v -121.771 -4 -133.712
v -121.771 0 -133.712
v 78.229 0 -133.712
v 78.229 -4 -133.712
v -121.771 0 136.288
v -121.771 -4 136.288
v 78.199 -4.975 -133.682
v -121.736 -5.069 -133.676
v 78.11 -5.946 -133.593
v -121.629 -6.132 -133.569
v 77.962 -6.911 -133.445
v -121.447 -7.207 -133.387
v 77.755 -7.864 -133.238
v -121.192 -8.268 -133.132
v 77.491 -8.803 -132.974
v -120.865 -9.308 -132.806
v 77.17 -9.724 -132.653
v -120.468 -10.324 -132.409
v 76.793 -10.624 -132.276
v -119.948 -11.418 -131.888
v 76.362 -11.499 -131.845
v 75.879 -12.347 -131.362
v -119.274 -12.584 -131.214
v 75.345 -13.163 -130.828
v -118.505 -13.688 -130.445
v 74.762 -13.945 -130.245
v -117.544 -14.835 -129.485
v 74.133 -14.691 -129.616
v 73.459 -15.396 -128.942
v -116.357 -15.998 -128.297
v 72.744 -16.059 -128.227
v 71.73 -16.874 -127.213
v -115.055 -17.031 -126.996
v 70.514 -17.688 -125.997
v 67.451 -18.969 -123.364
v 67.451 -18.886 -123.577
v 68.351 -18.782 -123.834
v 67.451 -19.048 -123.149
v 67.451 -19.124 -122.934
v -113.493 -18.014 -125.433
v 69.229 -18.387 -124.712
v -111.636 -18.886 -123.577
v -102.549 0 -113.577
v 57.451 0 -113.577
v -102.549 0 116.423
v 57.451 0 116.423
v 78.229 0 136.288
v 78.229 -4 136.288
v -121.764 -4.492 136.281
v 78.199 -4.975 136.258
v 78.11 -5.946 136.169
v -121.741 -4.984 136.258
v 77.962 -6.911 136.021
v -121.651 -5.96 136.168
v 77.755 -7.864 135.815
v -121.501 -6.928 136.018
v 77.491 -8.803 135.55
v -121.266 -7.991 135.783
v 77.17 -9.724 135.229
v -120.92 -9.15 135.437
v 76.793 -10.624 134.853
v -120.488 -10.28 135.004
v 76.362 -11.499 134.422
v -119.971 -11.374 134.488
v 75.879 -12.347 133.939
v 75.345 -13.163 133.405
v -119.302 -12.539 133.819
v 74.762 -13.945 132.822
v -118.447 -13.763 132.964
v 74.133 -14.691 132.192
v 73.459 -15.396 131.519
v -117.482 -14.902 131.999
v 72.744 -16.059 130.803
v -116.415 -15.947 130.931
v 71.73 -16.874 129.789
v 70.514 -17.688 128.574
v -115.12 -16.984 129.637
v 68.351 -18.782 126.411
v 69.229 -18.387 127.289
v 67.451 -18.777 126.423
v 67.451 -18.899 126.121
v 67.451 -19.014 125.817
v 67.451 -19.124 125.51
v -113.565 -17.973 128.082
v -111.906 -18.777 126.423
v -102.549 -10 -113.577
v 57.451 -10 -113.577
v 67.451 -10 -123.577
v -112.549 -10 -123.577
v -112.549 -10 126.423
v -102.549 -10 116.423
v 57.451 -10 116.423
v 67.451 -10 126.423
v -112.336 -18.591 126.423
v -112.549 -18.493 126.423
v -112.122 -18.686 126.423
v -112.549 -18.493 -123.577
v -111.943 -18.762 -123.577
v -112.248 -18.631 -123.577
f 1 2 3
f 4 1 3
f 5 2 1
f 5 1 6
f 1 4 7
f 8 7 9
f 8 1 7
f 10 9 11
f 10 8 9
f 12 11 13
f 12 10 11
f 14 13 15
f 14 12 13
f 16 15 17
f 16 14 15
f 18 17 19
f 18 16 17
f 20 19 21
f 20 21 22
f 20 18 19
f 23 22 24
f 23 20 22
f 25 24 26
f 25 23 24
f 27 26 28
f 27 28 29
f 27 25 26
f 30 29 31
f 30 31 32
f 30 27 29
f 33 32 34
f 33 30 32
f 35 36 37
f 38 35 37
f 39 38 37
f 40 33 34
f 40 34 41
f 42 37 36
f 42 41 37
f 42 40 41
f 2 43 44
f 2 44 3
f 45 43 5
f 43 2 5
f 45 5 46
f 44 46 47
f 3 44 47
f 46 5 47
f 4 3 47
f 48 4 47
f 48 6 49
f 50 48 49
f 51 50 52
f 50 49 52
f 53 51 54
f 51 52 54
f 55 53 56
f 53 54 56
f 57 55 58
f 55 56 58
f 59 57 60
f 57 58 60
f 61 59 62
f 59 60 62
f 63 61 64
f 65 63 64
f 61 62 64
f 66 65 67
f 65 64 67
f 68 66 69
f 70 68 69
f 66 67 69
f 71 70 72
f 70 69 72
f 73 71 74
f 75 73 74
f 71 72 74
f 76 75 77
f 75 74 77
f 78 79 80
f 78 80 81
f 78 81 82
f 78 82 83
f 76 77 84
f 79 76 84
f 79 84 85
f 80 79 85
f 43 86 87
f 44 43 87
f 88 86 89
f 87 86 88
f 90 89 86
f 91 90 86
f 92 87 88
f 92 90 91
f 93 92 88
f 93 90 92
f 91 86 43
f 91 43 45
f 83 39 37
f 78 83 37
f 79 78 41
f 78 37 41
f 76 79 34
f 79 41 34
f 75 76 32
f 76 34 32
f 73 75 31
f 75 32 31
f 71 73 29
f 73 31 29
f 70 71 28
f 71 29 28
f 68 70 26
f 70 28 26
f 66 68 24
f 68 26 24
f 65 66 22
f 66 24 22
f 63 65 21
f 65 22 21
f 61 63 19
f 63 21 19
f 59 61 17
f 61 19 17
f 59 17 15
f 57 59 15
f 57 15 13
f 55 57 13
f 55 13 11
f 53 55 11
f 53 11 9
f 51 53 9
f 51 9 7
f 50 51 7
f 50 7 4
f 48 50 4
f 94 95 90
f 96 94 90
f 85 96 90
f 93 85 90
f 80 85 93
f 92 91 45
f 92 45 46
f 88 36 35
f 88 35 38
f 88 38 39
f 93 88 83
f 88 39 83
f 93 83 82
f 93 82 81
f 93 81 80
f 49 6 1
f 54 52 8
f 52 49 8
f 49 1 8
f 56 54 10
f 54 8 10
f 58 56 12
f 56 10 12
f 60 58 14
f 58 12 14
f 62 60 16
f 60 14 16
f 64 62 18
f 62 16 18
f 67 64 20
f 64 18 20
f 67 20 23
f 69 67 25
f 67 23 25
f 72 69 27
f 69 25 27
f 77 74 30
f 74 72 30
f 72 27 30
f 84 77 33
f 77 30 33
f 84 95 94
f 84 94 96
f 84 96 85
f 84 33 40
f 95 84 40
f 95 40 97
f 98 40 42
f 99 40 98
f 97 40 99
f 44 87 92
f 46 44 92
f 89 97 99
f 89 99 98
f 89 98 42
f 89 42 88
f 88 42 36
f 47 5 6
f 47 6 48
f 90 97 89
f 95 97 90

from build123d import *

# Parameters (mm, degrees)
F0_W        = 200
F0_H        = 270
F1_DEPTH    = 20
F2_W        = 180
F2_H        = 250
F3_DEPTH    = 10
F4_W        = 160
F4_H        = 230
F5_DEPTH    = 25
F6_T1_DEPTH = 350
F6_T3_DEPTH = 280


# Not quite as in the source:
# - a fillet or chamfer that OpenCascade refuses, or shapes differently, is made with other operations: its cross-section is extruded or revolved along the edge and cut away or added


with BuildPart() as f1:
    # F0 (on Front) → F1 (new body)
    with BuildSketch(Plane.XZ):
        with Locations((-21.7714021464, 1.2882190198)):
            Rectangle(F0_W, F0_H)
    extrude(amount=F1_DEPTH)

    # F2 (on face) → F3 (cut)
    with BuildSketch(Plane.XZ.offset(20)):
        with Locations((-22.5493634492, 1.4232655292)):
            Rectangle(F2_W, F2_H)
    extrude(amount=-F3_DEPTH, mode=Mode.SUBTRACT)

    # F4 (on face) → F5 (cut)
    with BuildSketch(Plane.XZ.offset(10)):
        with Locations((-22.5493634492, 1.4232655292)):
            Rectangle(F4_W, F4_H)
    extrude(amount=-F5_DEPTH, mode=Mode.SUBTRACT)

    # F6: fillet of radius 16 on 4 edges, made by hand

    # F6_s2 → F6_t1 (cut)
    with BuildSketch(Plane.XY.offset(-173.7117809802)):
        with BuildLine():
            ThreePointArc((-121.7714021464, -4), (-117.0851106454, -15.313708499), (-105.7714021464, -20))
            Line((-105.7714021464, -20), (-121.7714021464, -20))
            Line((-121.7714021464, -20), (-121.7714021464, -4))
        make_face()
        with BuildLine():
            ThreePointArc((62.2285978536, -20), (73.5423063526, -15.313708499), (78.2285978536, -4))
            Line((78.2285978536, -4), (78.2285978536, -20))
            Line((78.2285978536, -20), (62.2285978536, -20))
        make_face()
    extrude(amount=F6_T1_DEPTH, mode=Mode.SUBTRACT)

    # F6_s4 → F6_t3 (cut)
    with BuildSketch(Plane.YZ.offset(-161.7714021464)):
        with BuildLine():
            ThreePointArc((-4, 136.2882190198), (-15.313708499, 131.6019275188), (-20, 120.2882190198))
            Line((-20, 120.2882190198), (-20, 136.2882190198))
            Line((-20, 136.2882190198), (-4, 136.2882190198))
        make_face()
        with BuildLine():
            ThreePointArc((-4, -133.7117809802), (-15.313708499, -129.0254894792), (-20, -117.7117809802))
            Line((-20, -117.7117809802), (-20, -133.7117809802))
            Line((-20, -133.7117809802), (-4, -133.7117809802))
        make_face()
    extrude(amount=F6_T3_DEPTH, mode=Mode.SUBTRACT)


solid = f1.part
